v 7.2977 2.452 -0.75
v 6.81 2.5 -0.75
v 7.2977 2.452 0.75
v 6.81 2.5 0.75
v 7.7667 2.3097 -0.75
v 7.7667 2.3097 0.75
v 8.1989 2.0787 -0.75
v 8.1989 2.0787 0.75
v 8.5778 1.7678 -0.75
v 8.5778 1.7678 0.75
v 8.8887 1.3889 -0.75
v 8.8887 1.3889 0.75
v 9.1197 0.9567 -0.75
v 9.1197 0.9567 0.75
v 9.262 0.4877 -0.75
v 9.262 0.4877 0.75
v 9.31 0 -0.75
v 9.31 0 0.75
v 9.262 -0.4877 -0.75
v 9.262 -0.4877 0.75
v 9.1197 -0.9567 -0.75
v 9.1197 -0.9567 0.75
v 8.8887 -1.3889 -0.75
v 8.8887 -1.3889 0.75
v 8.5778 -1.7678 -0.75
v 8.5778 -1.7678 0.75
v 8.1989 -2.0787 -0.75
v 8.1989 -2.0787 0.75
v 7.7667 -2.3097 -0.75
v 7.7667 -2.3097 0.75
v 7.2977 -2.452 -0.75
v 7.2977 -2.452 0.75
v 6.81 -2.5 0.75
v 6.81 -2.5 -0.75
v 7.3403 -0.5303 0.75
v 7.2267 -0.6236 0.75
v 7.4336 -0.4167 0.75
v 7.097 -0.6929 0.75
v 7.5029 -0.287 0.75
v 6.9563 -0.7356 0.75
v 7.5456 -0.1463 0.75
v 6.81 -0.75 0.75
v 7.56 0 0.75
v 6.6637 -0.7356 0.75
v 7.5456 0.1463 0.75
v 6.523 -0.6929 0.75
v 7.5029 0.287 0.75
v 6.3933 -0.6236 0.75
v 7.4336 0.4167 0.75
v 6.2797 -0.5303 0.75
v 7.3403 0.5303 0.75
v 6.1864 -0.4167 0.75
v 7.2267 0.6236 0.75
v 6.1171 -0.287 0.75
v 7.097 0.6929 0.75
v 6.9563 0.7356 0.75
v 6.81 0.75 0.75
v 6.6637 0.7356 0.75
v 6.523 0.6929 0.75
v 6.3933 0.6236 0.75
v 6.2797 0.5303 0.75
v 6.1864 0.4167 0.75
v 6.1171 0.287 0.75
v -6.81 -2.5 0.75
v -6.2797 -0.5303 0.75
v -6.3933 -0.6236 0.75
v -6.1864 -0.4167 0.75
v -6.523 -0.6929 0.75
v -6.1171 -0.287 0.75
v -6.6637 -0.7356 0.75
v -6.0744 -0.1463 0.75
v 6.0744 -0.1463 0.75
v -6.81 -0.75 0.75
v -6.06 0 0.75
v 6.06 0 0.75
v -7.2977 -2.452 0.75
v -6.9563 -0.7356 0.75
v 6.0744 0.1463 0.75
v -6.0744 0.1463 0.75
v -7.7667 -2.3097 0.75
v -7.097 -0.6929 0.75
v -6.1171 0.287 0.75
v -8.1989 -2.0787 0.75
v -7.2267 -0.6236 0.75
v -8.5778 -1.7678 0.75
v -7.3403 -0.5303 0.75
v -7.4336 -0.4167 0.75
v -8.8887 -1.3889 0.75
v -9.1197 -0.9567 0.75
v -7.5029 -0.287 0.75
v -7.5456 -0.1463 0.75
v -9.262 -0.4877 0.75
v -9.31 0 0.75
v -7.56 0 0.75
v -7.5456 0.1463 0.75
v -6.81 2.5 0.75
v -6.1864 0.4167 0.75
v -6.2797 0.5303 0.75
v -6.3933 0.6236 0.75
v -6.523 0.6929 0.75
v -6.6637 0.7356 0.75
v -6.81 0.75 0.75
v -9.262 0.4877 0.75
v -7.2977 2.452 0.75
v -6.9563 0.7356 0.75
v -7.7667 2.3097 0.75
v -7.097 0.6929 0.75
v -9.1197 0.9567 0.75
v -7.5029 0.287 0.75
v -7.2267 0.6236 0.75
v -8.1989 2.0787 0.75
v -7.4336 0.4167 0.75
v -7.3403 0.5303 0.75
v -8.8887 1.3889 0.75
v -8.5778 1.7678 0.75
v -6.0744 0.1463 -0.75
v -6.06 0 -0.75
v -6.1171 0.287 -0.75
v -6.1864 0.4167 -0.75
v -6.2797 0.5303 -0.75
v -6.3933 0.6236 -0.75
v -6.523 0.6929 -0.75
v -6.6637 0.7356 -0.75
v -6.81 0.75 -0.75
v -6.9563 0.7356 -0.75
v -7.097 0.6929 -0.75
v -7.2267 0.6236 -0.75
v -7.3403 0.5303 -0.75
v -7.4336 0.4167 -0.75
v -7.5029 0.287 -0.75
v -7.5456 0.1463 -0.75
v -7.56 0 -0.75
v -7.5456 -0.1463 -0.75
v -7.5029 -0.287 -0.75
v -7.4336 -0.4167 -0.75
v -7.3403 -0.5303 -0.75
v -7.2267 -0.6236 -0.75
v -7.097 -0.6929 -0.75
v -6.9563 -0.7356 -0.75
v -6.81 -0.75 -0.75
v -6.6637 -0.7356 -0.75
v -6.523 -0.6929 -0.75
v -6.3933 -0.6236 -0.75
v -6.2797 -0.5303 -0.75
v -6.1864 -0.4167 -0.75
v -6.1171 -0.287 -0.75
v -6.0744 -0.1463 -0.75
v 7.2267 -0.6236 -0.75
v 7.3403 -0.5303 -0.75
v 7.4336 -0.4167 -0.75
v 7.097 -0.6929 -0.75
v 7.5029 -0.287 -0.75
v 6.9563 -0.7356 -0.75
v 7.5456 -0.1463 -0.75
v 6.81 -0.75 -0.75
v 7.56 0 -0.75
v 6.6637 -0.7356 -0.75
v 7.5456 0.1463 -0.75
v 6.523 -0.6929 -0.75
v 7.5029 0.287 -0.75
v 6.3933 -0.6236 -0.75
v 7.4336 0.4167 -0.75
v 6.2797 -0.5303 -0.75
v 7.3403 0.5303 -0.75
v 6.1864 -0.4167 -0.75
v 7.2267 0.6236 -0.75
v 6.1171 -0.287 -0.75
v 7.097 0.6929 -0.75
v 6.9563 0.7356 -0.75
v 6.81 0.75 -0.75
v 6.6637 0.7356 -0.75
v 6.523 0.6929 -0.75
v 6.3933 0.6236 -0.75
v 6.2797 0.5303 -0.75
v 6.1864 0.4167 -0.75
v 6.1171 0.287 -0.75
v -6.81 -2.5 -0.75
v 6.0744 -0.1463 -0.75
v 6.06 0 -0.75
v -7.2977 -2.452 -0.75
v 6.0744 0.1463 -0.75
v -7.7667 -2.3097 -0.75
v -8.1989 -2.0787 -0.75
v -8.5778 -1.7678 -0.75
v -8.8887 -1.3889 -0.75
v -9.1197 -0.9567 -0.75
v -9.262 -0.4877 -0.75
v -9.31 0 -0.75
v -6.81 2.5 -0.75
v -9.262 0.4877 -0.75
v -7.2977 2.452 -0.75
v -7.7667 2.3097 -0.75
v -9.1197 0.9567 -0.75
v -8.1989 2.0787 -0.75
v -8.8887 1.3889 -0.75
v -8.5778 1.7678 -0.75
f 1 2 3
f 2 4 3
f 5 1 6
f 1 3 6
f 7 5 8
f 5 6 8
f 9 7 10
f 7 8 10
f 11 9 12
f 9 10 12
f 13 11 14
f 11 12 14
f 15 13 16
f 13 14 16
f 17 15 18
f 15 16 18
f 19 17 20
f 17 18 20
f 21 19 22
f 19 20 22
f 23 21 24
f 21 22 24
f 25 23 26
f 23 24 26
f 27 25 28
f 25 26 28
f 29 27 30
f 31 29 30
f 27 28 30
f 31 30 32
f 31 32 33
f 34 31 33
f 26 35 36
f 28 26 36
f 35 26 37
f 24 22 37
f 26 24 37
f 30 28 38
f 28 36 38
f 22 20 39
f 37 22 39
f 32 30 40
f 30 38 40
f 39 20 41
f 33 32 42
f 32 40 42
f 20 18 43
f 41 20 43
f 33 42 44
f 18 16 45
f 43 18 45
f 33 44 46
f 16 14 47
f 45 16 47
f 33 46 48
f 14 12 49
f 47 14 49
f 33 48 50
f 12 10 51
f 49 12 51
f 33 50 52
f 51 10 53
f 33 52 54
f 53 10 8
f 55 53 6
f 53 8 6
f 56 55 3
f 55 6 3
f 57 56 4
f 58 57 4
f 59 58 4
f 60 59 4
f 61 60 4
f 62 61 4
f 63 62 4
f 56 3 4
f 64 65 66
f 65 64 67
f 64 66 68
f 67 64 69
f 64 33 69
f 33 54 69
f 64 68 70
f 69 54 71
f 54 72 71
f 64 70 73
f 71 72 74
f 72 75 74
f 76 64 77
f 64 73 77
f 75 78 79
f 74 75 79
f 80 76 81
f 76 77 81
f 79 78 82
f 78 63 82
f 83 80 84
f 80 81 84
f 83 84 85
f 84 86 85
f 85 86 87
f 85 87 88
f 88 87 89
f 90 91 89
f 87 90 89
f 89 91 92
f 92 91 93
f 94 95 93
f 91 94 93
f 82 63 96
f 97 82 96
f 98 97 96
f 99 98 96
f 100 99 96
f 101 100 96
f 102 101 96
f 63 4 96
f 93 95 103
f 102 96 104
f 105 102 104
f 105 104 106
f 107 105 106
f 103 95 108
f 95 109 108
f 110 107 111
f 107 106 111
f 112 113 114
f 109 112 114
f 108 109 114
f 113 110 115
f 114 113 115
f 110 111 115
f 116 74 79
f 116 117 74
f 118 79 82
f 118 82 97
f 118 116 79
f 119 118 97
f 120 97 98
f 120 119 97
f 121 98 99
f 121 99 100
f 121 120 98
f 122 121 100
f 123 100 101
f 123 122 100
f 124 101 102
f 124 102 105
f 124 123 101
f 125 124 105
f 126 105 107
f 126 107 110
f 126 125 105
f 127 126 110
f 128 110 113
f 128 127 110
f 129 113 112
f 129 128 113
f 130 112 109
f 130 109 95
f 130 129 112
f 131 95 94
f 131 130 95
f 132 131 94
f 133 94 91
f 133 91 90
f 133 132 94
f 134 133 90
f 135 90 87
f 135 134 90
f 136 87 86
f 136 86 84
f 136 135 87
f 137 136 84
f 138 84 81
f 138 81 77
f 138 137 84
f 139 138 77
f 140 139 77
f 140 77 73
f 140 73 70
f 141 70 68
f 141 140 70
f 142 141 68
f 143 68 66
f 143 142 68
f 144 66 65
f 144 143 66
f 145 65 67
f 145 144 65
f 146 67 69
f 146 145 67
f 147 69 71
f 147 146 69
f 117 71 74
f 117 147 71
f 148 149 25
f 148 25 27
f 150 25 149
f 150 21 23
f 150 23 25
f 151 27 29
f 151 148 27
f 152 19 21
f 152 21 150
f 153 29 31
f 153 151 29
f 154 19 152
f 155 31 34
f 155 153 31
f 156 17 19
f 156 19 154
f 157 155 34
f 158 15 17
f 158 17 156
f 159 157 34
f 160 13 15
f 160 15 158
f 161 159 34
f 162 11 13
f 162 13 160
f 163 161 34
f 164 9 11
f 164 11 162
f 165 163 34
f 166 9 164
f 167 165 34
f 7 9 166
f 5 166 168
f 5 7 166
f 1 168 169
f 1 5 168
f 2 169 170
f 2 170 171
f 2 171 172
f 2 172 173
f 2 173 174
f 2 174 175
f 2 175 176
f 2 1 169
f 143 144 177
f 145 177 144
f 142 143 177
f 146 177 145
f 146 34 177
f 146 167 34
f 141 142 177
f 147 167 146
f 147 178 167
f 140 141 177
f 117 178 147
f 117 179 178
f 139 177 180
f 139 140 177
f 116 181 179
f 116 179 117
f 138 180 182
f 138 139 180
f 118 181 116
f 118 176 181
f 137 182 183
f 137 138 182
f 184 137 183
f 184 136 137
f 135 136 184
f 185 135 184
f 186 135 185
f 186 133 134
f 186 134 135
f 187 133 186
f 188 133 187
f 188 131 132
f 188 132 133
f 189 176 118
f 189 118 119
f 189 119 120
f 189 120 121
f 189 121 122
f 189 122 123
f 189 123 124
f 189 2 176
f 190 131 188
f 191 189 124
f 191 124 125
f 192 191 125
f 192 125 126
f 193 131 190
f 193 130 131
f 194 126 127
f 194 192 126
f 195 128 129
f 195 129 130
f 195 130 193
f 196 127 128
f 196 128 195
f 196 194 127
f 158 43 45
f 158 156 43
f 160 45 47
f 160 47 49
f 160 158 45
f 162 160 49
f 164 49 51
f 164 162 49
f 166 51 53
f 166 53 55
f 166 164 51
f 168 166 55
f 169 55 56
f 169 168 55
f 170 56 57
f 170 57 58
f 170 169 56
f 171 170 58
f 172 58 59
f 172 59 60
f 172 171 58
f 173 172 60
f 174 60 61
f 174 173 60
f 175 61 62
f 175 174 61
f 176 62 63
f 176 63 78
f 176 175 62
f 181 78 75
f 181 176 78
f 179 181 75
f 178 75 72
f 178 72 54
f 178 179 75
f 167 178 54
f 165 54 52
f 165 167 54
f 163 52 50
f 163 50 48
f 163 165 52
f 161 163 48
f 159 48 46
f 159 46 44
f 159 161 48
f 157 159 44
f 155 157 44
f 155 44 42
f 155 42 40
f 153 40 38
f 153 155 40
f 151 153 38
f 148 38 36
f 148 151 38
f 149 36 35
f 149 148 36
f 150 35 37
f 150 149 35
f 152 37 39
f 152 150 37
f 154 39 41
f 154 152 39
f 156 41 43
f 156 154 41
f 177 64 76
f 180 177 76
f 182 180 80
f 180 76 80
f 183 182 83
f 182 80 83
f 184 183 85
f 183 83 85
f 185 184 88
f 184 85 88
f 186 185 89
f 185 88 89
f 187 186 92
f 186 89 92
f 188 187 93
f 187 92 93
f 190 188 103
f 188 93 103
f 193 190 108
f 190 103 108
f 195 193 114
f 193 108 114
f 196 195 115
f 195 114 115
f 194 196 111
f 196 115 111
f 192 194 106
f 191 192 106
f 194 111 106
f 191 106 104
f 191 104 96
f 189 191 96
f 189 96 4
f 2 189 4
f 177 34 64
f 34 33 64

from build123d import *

# Parameters (mm, degrees)
SKETCH_1_R      = 0.75
EXTRUDE_1_DEPTH = 0.75


with BuildPart() as part:
    # 草圖1 → 填料-伸長1 (new body, symmetric)
    with BuildSketch(Plane.XY):
        with BuildLine():
            Line((-6.81, 2.5), (6.81, 2.5))
            ThreePointArc((6.81, 2.5), (9.31, 0), (6.81, -2.5))
            Line((6.81, -2.5), (-6.81, -2.5))
            ThreePointArc((-6.81, -2.5), (-9.31, 0), (-6.81, 2.5))
        make_face()
        with Locations((-6.81, 0)):
            Circle(SKETCH_1_R, mode=Mode.SUBTRACT)
        with Locations((6.81, 0)):
            Circle(SKETCH_1_R, mode=Mode.SUBTRACT)
    extrude(amount=EXTRUDE_1_DEPTH, both=True)


solid = part.part
